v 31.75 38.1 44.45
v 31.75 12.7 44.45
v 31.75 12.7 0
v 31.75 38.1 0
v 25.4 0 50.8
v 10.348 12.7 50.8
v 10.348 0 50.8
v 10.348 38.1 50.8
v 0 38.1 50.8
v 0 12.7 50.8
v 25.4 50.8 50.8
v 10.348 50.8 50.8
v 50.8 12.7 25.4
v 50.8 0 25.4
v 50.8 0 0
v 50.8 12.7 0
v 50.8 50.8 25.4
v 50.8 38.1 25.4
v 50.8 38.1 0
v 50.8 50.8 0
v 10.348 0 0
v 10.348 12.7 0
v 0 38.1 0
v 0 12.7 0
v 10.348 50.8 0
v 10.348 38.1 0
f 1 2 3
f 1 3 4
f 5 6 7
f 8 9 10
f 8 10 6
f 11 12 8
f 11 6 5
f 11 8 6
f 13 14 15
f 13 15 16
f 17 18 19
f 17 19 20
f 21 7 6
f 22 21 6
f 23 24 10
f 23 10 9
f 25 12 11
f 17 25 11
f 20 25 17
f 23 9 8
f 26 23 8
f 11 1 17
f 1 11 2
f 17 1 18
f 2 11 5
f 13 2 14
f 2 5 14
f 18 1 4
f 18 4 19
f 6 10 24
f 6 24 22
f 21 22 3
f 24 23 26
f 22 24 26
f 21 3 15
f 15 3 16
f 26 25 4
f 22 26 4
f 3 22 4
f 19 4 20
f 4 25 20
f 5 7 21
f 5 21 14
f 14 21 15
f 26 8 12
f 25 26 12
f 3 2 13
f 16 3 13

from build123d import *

# Parameters (mm, degrees)
F0_W     = 50.8
F0_H     = 50.8
F1_DEPTH = 50.8
F2_W     = 19.05
F2_H     = 25.4
F3_DEPTH = 50.801
F5_DEPTH = 50.801
F6_W     = 10.347801
F6_H     = 12.7
F7_DEPTH = 50.801


with BuildPart() as f1:
    # F0 (on Top) → F1 (new body)
    with BuildSketch(Plane.XY):
        with Locations((25.4, 25.4)):
            Rectangle(F0_W, F0_H)
    extrude(amount=F1_DEPTH)

    # F2 (on face) → F3 (cut, through all)
    with BuildSketch(Plane.XY.offset(50.8)):
        with Locations((41.275, 25.4)):
            Rectangle(F2_W, F2_H)
    extrude(amount=-F3_DEPTH, mode=Mode.SUBTRACT)

    # F4 (on face) → F5 (cut, through all)
    with BuildSketch(Plane.XZ):
        Polygon((25.4, 50.8), (50.8, 25.4), (50.8, 50.8), align=None)
    extrude(amount=-F5_DEPTH, mode=Mode.SUBTRACT)

    # F6 (on face) → F7 (cut, through all)
    with BuildSketch(Plane.XY.offset(50.8)):
        with Locations((5.1739, 6.35)):
            Rectangle(F6_W, F6_H)
        with Locations((5.1739, 44.45)):
            Rectangle(F6_W, F6_H)
    extrude(amount=-F7_DEPTH, mode=Mode.SUBTRACT)


solid = f1.part
